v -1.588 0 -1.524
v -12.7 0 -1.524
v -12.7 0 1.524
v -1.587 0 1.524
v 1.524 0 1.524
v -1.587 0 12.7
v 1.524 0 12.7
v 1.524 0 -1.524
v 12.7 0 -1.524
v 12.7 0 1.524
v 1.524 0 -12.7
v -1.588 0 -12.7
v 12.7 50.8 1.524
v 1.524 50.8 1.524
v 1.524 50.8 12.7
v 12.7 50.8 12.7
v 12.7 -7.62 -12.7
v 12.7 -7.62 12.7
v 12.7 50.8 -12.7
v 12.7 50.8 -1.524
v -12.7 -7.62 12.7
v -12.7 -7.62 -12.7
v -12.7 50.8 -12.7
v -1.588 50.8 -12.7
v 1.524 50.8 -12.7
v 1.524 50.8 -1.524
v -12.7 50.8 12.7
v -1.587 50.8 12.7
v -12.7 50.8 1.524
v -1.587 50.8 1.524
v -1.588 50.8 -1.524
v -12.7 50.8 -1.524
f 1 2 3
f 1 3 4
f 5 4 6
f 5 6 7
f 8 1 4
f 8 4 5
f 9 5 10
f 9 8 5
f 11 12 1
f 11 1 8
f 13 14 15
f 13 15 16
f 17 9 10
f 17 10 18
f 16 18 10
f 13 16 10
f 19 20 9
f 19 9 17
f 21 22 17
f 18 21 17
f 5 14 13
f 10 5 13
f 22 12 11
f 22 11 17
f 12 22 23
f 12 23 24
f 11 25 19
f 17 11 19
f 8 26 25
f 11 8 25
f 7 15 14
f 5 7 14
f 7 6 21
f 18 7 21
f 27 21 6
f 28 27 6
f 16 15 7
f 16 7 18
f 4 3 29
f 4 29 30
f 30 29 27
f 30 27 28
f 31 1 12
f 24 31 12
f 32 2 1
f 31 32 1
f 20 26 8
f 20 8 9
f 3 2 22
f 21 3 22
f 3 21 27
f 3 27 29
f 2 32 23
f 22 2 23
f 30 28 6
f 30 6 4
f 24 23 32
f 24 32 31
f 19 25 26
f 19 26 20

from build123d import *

# Parameters (mm, degrees)
SKETCH1_W             = 11.1125
SKETCH1_H             = 11.176
BOSS_EXTRUDE1_DEPTH   = 50.8
SKETCH1_W_2           = 11.176
BOSS_EXTRUDE1_2_DEPTH = 50.8
BOSS_EXTRUDE1_3_DEPTH = 50.8
BOSS_EXTRUDE1_4_DEPTH = 50.8
SKETCH1_4_W           = 25.4
SKETCH1_4_H           = 25.4
BOSS_EXTRUDE2_DEPTH   = 7.62


with BuildPart() as part:
    # Sketch1 → Boss-Extrude1 (new body)
    with BuildSketch(Plane(origin=(0, 0, 0), x_dir=(1, 0, 0), z_dir=(0, 1, 0))):
        with Locations((-7.14375, 7.112)):
            Rectangle(SKETCH1_W, SKETCH1_H)
    extrude(amount=BOSS_EXTRUDE1_DEPTH)



with BuildPart() as body_2:
    # Sketch1 → Boss-Extrude1 2 (new body)
    with BuildSketch(Plane(origin=(0, 0, 0), x_dir=(1, 0, 0), z_dir=(0, 1, 0))):
        with Locations((7.112, 7.112)):
            Rectangle(SKETCH1_W_2, SKETCH1_H)
    extrude(amount=BOSS_EXTRUDE1_2_DEPTH)


with BuildPart() as body_3:
    # Sketch1 → Boss-Extrude1 3 (new body)
    with BuildSketch(Plane(origin=(0, 0, 0), x_dir=(1, 0, 0), z_dir=(0, 1, 0))):
        with Locations((-7.14375, -7.112)):
            Rectangle(SKETCH1_W, SKETCH1_H)
    extrude(amount=BOSS_EXTRUDE1_3_DEPTH)


with BuildPart() as body_4:
    # Sketch1 → Boss-Extrude1 4 (new body)
    with BuildSketch(Plane(origin=(0, 0, 0), x_dir=(1, 0, 0), z_dir=(0, 1, 0))):
        with Locations((7.112, -7.112)):
            Rectangle(SKETCH1_W_2, SKETCH1_H)
    extrude(amount=BOSS_EXTRUDE1_4_DEPTH)


with BuildPart() as part_1:
    add(part.part)

    add(body_2.part)  # Boss-Extrude2 merges body 2

    add(body_3.part)  # Boss-Extrude2 merges body 3

    add(body_4.part)  # Boss-Extrude2 merges body 4
    # Sketch1<4> → Boss-Extrude2 (add)
    with BuildSketch(Plane(origin=(0, 0, 0), x_dir=(1, 0, 0), z_dir=(0, 1, 0))):
        Rectangle(SKETCH1_4_W, SKETCH1_4_H)
    extrude(amount=-BOSS_EXTRUDE2_DEPTH)


solid = part_1.part
